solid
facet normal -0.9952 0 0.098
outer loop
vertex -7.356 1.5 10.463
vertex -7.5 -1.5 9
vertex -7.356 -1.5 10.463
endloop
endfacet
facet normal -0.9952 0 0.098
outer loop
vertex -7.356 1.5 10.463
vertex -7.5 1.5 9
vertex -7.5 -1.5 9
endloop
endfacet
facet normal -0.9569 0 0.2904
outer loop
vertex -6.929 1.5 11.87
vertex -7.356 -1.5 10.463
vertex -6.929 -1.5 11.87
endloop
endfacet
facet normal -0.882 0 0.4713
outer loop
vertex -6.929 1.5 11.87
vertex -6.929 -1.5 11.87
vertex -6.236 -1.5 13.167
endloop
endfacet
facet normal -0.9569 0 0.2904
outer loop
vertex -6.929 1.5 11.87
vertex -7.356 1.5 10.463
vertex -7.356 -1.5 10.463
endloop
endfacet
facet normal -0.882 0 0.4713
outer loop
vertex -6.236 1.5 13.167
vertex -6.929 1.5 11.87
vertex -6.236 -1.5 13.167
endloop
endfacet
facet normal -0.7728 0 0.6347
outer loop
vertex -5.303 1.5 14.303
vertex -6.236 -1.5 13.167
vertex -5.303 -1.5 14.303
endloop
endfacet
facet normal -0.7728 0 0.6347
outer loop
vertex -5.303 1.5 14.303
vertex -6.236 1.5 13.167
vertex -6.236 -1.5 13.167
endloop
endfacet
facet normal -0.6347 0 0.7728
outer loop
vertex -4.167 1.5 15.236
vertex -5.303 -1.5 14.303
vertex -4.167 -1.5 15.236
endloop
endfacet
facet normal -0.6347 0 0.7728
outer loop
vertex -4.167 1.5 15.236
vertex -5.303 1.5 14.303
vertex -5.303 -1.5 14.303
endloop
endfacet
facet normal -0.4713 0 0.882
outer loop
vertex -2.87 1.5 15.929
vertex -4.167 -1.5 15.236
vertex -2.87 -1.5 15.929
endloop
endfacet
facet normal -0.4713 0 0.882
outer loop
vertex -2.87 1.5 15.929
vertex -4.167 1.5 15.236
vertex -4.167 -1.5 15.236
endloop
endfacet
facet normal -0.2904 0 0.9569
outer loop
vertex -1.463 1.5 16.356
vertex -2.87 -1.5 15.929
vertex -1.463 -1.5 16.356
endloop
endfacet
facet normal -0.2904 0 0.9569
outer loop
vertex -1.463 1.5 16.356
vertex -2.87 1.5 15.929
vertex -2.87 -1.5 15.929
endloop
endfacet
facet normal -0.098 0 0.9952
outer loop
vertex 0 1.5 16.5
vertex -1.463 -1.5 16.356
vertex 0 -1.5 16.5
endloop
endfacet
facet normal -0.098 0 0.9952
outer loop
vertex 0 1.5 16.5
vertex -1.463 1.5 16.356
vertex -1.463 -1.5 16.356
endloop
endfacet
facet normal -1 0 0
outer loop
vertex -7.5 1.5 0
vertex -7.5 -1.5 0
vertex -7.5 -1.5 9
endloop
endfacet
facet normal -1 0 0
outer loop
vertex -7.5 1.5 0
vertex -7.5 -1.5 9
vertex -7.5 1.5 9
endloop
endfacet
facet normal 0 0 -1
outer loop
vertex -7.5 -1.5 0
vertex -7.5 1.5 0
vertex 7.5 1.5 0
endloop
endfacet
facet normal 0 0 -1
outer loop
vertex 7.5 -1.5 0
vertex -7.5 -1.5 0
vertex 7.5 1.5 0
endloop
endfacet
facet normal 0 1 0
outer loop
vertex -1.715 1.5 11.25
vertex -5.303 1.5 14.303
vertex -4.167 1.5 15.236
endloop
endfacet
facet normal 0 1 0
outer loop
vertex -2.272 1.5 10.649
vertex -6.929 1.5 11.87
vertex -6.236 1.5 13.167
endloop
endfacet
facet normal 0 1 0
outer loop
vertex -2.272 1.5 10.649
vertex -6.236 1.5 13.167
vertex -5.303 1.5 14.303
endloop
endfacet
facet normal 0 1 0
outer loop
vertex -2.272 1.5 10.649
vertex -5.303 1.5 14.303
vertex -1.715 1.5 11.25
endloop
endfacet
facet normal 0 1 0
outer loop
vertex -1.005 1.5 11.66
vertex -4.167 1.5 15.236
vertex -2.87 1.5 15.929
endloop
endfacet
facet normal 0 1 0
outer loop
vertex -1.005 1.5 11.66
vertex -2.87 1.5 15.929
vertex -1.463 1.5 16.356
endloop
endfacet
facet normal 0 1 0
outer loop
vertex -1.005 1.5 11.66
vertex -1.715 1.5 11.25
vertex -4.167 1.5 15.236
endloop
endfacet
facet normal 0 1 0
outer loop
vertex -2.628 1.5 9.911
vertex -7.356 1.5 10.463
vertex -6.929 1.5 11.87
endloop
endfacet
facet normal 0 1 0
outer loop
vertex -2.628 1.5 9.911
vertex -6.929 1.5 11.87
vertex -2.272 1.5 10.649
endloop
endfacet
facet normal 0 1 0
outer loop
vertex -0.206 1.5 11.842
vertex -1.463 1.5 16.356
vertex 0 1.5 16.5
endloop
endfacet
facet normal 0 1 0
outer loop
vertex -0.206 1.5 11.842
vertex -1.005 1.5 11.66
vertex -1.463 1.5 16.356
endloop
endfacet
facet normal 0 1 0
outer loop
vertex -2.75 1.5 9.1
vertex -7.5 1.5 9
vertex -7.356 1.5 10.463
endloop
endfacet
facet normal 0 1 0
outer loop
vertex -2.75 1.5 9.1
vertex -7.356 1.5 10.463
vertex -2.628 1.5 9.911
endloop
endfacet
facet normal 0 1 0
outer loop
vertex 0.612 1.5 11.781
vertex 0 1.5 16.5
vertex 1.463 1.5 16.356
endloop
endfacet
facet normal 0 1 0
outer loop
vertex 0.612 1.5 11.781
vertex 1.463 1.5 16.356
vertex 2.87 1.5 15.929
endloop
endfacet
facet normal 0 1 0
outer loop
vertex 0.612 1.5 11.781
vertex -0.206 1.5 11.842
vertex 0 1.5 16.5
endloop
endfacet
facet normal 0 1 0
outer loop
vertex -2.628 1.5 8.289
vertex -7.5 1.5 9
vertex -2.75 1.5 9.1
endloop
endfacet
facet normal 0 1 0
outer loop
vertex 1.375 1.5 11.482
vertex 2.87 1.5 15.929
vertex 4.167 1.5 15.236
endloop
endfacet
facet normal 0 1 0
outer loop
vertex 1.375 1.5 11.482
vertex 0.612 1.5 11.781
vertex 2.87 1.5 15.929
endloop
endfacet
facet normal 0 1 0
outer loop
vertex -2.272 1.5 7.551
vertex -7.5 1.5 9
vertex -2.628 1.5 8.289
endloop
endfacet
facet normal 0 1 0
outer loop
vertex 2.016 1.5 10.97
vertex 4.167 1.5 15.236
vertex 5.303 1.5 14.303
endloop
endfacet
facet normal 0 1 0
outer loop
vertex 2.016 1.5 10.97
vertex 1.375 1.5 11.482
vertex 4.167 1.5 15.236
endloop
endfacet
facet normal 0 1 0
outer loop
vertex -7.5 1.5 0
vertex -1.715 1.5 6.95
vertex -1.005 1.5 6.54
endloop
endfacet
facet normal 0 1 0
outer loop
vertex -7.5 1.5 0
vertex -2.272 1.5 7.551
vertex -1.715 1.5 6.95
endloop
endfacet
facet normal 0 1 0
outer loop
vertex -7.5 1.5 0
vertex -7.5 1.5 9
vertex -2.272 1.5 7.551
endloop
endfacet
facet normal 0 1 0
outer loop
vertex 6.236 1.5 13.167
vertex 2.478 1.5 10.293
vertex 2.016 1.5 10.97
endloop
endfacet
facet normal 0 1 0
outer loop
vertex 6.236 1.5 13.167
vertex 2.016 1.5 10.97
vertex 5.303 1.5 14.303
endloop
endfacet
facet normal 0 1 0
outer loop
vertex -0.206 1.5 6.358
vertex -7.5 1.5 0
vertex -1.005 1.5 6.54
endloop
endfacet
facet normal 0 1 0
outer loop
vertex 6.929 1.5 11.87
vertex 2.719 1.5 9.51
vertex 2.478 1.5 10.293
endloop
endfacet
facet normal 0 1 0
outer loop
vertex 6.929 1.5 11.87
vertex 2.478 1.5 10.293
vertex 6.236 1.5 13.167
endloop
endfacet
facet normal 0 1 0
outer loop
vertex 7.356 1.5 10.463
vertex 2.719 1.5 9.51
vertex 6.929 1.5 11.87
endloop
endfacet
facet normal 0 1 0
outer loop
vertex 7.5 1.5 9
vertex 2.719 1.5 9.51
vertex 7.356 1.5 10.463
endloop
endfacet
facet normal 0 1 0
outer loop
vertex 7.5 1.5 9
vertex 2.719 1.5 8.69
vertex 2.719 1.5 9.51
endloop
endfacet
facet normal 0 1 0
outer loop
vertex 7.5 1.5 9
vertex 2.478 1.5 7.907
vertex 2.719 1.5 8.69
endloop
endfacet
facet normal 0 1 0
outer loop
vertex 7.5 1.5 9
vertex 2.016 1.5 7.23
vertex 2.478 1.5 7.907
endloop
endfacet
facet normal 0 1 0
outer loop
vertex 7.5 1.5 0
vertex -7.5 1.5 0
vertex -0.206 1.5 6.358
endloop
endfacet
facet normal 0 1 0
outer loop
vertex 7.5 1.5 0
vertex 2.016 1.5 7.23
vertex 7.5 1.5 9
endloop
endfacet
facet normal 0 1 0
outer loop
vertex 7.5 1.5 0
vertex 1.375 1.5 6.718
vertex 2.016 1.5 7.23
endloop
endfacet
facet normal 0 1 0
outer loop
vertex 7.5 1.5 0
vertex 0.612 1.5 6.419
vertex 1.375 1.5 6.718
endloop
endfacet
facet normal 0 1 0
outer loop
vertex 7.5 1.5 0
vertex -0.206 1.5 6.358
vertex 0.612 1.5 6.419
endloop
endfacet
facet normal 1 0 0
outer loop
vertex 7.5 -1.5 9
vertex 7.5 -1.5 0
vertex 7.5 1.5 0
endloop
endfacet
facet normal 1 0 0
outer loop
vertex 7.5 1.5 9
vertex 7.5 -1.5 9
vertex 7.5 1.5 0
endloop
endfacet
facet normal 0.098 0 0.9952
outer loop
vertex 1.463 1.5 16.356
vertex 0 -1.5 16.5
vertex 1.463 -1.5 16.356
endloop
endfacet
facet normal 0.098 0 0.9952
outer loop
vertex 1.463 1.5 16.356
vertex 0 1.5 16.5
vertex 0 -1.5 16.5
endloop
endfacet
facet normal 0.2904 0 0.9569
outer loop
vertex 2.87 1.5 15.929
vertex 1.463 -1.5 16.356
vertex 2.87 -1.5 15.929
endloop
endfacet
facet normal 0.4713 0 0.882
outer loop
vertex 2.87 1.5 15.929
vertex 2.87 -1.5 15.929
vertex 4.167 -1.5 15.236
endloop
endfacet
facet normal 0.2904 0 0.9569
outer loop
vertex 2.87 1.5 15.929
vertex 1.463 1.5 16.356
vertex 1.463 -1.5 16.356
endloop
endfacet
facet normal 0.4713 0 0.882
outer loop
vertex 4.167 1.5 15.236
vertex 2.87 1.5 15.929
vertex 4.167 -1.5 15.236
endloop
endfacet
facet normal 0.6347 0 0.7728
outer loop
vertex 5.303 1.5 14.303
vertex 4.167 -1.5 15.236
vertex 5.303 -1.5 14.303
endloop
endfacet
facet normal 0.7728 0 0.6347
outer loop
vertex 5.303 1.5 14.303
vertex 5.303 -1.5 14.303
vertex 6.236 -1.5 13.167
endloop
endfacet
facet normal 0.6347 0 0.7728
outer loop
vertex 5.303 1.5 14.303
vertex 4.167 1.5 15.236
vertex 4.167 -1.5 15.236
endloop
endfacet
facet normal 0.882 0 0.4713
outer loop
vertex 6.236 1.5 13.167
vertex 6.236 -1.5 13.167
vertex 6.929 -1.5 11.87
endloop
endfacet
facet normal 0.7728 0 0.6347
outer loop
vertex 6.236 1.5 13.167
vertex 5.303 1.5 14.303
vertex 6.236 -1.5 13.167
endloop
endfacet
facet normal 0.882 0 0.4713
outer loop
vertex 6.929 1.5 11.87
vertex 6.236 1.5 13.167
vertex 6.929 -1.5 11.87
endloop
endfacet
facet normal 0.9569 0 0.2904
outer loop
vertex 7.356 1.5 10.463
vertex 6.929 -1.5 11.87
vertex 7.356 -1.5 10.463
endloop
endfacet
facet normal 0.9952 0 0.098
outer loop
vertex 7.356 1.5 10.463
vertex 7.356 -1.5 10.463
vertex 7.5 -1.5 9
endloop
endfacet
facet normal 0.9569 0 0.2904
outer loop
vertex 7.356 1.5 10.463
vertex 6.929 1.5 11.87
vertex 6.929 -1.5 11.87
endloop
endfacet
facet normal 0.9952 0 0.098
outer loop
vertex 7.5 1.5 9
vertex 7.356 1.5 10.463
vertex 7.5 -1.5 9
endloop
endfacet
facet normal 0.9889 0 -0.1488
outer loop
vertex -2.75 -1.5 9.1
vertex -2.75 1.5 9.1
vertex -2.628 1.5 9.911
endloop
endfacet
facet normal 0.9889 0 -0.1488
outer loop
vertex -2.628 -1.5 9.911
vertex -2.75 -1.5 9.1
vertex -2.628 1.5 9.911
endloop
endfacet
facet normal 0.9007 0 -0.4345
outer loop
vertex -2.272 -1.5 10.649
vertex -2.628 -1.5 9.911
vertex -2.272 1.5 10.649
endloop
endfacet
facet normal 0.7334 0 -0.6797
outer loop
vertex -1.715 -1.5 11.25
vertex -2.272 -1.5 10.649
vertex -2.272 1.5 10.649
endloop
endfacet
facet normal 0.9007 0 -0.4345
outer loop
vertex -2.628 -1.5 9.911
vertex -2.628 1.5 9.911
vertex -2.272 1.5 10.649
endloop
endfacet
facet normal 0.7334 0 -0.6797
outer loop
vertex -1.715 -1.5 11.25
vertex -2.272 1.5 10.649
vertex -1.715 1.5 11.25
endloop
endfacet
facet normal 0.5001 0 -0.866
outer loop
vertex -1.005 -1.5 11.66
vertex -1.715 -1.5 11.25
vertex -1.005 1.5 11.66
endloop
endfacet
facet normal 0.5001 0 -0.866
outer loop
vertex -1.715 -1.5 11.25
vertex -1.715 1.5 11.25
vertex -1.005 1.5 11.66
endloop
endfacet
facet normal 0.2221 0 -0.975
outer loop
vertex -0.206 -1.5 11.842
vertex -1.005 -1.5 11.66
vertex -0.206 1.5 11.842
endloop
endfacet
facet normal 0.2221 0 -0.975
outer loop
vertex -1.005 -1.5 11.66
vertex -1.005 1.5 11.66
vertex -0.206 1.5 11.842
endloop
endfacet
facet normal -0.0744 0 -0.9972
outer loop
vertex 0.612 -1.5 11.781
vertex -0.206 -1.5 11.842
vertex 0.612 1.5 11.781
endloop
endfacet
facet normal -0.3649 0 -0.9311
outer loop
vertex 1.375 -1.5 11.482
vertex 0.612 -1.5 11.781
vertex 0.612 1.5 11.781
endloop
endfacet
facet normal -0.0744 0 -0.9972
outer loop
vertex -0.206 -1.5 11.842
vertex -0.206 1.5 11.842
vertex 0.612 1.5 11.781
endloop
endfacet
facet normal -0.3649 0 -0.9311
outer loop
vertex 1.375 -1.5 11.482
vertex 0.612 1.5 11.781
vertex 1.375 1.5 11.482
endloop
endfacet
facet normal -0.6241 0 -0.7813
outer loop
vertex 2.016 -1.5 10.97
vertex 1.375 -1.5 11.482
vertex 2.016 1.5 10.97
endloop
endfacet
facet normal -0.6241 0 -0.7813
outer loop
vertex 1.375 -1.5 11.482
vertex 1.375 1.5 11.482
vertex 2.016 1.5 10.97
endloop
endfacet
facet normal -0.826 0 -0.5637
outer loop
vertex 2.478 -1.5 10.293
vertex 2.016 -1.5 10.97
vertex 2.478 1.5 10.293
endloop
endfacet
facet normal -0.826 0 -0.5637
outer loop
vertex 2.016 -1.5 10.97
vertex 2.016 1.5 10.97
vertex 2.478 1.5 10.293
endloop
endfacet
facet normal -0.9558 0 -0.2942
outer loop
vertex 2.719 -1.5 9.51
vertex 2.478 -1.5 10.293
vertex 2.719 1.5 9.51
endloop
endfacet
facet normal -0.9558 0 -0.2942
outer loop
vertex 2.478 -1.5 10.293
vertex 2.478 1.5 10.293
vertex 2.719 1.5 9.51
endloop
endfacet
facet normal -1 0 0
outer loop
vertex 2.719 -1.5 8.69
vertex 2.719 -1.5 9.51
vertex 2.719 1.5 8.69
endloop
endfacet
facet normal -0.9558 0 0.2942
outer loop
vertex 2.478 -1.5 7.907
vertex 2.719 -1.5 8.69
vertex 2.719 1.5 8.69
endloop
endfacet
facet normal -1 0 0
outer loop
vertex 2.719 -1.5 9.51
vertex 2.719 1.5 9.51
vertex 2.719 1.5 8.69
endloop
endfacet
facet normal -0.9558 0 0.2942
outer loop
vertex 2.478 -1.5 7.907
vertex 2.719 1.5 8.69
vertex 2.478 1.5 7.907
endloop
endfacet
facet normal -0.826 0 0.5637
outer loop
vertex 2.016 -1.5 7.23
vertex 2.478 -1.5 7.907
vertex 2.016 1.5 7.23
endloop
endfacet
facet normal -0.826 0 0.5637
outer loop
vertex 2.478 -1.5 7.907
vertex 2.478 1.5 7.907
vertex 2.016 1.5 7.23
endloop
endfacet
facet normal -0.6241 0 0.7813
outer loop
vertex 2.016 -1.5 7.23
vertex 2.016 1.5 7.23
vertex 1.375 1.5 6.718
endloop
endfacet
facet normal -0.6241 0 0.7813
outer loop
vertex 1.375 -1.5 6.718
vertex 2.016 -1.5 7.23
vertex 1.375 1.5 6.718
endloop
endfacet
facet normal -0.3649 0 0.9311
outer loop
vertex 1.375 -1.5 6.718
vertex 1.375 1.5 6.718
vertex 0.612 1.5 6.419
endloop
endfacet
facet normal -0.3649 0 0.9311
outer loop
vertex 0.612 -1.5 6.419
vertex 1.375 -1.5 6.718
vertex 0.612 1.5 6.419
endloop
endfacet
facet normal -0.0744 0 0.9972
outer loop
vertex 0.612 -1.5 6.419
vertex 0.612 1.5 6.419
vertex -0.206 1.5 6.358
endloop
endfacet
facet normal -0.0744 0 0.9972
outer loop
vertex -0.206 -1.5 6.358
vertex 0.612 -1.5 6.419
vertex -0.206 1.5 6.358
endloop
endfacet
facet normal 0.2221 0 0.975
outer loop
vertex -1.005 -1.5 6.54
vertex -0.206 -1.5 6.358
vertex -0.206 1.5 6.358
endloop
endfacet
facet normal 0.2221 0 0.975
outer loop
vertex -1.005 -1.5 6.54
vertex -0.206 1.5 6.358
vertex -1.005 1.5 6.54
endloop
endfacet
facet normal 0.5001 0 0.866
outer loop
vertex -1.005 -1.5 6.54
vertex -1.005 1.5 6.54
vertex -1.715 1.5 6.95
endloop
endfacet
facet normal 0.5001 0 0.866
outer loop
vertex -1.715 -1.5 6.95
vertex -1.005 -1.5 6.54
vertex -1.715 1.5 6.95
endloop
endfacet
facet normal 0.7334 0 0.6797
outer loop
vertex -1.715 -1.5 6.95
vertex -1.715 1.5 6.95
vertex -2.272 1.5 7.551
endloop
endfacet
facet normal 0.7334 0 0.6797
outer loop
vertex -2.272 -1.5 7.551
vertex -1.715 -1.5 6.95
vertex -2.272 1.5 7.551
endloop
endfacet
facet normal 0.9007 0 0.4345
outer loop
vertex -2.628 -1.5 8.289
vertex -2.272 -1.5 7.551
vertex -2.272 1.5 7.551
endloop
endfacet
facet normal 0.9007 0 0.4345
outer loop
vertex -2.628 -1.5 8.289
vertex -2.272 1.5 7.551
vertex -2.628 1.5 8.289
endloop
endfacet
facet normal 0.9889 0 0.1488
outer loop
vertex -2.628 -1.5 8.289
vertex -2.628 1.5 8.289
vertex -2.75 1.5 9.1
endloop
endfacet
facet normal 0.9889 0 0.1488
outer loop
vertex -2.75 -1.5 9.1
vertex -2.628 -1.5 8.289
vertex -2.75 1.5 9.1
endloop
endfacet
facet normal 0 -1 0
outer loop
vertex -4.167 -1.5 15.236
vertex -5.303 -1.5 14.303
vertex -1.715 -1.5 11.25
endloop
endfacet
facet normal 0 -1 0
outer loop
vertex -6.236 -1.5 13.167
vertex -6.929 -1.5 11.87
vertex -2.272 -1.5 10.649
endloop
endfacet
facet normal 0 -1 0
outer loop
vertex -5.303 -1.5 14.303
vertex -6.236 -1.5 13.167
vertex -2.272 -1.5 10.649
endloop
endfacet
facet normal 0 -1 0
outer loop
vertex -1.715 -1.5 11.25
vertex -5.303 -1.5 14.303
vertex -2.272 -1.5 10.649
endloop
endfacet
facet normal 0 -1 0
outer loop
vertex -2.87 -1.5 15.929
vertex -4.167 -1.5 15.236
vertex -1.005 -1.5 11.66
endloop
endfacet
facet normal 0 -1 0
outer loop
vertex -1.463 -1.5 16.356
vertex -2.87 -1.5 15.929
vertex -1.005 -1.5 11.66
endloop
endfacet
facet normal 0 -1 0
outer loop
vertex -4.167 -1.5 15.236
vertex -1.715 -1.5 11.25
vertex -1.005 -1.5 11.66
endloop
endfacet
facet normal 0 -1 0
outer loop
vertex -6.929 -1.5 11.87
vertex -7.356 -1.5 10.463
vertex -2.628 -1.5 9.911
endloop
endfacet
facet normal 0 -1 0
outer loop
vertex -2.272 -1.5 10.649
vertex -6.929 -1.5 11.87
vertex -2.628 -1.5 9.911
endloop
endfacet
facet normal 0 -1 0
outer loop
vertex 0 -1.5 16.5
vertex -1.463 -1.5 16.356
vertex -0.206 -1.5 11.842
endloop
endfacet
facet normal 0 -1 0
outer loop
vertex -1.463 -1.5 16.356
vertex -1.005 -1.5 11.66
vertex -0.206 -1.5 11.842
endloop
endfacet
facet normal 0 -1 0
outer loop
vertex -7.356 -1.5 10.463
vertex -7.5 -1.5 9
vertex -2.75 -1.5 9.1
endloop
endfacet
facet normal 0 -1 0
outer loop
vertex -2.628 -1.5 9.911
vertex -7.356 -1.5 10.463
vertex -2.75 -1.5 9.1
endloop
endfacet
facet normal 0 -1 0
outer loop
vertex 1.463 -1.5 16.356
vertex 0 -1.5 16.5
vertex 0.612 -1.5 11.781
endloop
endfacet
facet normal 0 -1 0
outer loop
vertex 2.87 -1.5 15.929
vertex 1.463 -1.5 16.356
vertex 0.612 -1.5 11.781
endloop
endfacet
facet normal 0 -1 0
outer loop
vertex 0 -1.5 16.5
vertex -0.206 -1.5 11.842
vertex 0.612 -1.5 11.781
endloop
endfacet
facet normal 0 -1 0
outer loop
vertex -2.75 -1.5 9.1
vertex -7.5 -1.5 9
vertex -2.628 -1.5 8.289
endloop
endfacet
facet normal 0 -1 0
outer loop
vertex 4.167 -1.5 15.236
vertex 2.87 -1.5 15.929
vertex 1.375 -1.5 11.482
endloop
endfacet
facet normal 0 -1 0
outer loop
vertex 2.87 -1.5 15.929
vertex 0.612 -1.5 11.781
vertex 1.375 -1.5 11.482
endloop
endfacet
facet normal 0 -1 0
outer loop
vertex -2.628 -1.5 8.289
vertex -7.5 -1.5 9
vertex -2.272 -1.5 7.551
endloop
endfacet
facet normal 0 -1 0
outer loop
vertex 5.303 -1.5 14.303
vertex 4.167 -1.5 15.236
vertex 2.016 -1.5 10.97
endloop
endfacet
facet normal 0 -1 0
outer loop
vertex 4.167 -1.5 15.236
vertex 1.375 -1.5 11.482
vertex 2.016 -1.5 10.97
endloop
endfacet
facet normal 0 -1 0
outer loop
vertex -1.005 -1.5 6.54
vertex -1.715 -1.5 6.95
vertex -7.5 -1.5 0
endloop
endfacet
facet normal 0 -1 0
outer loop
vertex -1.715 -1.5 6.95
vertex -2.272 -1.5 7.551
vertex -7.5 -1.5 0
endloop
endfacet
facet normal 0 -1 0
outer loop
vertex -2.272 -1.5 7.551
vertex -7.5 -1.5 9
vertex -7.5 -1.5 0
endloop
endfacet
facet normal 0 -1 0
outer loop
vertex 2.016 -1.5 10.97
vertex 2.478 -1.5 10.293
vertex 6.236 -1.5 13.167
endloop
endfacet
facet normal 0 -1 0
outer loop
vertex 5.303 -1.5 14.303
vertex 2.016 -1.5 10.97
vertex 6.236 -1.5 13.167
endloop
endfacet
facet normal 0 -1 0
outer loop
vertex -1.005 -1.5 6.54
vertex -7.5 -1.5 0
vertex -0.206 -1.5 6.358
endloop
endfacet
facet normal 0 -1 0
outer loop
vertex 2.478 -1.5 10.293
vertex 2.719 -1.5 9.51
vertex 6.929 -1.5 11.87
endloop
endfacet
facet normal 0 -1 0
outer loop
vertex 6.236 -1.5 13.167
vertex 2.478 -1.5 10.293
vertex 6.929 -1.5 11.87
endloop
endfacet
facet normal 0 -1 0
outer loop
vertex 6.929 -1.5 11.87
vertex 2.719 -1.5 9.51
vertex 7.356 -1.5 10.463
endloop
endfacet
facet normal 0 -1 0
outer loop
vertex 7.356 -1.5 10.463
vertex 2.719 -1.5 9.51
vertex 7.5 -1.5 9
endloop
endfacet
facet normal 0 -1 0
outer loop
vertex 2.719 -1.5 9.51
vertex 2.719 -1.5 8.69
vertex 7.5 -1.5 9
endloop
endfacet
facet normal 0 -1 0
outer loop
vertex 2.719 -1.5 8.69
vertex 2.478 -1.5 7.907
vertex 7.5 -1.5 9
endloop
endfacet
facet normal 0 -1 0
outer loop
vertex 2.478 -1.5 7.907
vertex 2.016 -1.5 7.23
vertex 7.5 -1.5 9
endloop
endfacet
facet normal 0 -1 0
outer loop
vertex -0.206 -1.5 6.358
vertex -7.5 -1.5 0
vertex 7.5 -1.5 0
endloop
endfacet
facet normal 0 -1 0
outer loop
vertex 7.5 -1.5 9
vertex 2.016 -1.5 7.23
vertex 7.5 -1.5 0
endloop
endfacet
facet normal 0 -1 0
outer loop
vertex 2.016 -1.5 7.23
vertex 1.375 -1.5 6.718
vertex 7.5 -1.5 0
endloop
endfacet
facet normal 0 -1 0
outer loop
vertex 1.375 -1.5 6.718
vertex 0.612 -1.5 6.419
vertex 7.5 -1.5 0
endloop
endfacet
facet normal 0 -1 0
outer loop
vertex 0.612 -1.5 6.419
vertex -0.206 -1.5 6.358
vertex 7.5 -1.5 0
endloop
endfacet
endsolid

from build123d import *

# Parameters (mm, degrees)
F0_W     = 15
F0_H     = 3
F1_DEPTH = 16.5
F2_R     = 2.75
F3_DEPTH = 25
F4_R     = 7.49999


# Not quite as in the source:
# - a fillet or chamfer is up to 0.001 mm smaller than in the source, because OpenCascade refuses the exact size


with BuildPart() as f1:
    # F0 (on Top) → F1 (new body)
    with BuildSketch(Plane.XY):
        Rectangle(F0_W, F0_H)
    extrude(amount=F1_DEPTH)

    # F2 (on face) → F3 (cut)
    with BuildSketch(Plane(origin=(0, 1.5, 0), x_dir=(-1, 0, 0), z_dir=(0, 1, 0))):
        with Locations((0, 9.1)):
            Circle(F2_R)
    extrude(amount=-F3_DEPTH, mode=Mode.SUBTRACT)

    # F4 (radius 7.5 in the source; OpenCascade refuses exactly that, so slightly less here)
    f4_edges = [f1.edges().sort_by_distance(p)[0] for p in [
        (-7.5, 0, 16.5),
        (7.5, 0, 16.5),
    ]]
    fillet(f4_edges, radius=F4_R)


solid = f1.part
